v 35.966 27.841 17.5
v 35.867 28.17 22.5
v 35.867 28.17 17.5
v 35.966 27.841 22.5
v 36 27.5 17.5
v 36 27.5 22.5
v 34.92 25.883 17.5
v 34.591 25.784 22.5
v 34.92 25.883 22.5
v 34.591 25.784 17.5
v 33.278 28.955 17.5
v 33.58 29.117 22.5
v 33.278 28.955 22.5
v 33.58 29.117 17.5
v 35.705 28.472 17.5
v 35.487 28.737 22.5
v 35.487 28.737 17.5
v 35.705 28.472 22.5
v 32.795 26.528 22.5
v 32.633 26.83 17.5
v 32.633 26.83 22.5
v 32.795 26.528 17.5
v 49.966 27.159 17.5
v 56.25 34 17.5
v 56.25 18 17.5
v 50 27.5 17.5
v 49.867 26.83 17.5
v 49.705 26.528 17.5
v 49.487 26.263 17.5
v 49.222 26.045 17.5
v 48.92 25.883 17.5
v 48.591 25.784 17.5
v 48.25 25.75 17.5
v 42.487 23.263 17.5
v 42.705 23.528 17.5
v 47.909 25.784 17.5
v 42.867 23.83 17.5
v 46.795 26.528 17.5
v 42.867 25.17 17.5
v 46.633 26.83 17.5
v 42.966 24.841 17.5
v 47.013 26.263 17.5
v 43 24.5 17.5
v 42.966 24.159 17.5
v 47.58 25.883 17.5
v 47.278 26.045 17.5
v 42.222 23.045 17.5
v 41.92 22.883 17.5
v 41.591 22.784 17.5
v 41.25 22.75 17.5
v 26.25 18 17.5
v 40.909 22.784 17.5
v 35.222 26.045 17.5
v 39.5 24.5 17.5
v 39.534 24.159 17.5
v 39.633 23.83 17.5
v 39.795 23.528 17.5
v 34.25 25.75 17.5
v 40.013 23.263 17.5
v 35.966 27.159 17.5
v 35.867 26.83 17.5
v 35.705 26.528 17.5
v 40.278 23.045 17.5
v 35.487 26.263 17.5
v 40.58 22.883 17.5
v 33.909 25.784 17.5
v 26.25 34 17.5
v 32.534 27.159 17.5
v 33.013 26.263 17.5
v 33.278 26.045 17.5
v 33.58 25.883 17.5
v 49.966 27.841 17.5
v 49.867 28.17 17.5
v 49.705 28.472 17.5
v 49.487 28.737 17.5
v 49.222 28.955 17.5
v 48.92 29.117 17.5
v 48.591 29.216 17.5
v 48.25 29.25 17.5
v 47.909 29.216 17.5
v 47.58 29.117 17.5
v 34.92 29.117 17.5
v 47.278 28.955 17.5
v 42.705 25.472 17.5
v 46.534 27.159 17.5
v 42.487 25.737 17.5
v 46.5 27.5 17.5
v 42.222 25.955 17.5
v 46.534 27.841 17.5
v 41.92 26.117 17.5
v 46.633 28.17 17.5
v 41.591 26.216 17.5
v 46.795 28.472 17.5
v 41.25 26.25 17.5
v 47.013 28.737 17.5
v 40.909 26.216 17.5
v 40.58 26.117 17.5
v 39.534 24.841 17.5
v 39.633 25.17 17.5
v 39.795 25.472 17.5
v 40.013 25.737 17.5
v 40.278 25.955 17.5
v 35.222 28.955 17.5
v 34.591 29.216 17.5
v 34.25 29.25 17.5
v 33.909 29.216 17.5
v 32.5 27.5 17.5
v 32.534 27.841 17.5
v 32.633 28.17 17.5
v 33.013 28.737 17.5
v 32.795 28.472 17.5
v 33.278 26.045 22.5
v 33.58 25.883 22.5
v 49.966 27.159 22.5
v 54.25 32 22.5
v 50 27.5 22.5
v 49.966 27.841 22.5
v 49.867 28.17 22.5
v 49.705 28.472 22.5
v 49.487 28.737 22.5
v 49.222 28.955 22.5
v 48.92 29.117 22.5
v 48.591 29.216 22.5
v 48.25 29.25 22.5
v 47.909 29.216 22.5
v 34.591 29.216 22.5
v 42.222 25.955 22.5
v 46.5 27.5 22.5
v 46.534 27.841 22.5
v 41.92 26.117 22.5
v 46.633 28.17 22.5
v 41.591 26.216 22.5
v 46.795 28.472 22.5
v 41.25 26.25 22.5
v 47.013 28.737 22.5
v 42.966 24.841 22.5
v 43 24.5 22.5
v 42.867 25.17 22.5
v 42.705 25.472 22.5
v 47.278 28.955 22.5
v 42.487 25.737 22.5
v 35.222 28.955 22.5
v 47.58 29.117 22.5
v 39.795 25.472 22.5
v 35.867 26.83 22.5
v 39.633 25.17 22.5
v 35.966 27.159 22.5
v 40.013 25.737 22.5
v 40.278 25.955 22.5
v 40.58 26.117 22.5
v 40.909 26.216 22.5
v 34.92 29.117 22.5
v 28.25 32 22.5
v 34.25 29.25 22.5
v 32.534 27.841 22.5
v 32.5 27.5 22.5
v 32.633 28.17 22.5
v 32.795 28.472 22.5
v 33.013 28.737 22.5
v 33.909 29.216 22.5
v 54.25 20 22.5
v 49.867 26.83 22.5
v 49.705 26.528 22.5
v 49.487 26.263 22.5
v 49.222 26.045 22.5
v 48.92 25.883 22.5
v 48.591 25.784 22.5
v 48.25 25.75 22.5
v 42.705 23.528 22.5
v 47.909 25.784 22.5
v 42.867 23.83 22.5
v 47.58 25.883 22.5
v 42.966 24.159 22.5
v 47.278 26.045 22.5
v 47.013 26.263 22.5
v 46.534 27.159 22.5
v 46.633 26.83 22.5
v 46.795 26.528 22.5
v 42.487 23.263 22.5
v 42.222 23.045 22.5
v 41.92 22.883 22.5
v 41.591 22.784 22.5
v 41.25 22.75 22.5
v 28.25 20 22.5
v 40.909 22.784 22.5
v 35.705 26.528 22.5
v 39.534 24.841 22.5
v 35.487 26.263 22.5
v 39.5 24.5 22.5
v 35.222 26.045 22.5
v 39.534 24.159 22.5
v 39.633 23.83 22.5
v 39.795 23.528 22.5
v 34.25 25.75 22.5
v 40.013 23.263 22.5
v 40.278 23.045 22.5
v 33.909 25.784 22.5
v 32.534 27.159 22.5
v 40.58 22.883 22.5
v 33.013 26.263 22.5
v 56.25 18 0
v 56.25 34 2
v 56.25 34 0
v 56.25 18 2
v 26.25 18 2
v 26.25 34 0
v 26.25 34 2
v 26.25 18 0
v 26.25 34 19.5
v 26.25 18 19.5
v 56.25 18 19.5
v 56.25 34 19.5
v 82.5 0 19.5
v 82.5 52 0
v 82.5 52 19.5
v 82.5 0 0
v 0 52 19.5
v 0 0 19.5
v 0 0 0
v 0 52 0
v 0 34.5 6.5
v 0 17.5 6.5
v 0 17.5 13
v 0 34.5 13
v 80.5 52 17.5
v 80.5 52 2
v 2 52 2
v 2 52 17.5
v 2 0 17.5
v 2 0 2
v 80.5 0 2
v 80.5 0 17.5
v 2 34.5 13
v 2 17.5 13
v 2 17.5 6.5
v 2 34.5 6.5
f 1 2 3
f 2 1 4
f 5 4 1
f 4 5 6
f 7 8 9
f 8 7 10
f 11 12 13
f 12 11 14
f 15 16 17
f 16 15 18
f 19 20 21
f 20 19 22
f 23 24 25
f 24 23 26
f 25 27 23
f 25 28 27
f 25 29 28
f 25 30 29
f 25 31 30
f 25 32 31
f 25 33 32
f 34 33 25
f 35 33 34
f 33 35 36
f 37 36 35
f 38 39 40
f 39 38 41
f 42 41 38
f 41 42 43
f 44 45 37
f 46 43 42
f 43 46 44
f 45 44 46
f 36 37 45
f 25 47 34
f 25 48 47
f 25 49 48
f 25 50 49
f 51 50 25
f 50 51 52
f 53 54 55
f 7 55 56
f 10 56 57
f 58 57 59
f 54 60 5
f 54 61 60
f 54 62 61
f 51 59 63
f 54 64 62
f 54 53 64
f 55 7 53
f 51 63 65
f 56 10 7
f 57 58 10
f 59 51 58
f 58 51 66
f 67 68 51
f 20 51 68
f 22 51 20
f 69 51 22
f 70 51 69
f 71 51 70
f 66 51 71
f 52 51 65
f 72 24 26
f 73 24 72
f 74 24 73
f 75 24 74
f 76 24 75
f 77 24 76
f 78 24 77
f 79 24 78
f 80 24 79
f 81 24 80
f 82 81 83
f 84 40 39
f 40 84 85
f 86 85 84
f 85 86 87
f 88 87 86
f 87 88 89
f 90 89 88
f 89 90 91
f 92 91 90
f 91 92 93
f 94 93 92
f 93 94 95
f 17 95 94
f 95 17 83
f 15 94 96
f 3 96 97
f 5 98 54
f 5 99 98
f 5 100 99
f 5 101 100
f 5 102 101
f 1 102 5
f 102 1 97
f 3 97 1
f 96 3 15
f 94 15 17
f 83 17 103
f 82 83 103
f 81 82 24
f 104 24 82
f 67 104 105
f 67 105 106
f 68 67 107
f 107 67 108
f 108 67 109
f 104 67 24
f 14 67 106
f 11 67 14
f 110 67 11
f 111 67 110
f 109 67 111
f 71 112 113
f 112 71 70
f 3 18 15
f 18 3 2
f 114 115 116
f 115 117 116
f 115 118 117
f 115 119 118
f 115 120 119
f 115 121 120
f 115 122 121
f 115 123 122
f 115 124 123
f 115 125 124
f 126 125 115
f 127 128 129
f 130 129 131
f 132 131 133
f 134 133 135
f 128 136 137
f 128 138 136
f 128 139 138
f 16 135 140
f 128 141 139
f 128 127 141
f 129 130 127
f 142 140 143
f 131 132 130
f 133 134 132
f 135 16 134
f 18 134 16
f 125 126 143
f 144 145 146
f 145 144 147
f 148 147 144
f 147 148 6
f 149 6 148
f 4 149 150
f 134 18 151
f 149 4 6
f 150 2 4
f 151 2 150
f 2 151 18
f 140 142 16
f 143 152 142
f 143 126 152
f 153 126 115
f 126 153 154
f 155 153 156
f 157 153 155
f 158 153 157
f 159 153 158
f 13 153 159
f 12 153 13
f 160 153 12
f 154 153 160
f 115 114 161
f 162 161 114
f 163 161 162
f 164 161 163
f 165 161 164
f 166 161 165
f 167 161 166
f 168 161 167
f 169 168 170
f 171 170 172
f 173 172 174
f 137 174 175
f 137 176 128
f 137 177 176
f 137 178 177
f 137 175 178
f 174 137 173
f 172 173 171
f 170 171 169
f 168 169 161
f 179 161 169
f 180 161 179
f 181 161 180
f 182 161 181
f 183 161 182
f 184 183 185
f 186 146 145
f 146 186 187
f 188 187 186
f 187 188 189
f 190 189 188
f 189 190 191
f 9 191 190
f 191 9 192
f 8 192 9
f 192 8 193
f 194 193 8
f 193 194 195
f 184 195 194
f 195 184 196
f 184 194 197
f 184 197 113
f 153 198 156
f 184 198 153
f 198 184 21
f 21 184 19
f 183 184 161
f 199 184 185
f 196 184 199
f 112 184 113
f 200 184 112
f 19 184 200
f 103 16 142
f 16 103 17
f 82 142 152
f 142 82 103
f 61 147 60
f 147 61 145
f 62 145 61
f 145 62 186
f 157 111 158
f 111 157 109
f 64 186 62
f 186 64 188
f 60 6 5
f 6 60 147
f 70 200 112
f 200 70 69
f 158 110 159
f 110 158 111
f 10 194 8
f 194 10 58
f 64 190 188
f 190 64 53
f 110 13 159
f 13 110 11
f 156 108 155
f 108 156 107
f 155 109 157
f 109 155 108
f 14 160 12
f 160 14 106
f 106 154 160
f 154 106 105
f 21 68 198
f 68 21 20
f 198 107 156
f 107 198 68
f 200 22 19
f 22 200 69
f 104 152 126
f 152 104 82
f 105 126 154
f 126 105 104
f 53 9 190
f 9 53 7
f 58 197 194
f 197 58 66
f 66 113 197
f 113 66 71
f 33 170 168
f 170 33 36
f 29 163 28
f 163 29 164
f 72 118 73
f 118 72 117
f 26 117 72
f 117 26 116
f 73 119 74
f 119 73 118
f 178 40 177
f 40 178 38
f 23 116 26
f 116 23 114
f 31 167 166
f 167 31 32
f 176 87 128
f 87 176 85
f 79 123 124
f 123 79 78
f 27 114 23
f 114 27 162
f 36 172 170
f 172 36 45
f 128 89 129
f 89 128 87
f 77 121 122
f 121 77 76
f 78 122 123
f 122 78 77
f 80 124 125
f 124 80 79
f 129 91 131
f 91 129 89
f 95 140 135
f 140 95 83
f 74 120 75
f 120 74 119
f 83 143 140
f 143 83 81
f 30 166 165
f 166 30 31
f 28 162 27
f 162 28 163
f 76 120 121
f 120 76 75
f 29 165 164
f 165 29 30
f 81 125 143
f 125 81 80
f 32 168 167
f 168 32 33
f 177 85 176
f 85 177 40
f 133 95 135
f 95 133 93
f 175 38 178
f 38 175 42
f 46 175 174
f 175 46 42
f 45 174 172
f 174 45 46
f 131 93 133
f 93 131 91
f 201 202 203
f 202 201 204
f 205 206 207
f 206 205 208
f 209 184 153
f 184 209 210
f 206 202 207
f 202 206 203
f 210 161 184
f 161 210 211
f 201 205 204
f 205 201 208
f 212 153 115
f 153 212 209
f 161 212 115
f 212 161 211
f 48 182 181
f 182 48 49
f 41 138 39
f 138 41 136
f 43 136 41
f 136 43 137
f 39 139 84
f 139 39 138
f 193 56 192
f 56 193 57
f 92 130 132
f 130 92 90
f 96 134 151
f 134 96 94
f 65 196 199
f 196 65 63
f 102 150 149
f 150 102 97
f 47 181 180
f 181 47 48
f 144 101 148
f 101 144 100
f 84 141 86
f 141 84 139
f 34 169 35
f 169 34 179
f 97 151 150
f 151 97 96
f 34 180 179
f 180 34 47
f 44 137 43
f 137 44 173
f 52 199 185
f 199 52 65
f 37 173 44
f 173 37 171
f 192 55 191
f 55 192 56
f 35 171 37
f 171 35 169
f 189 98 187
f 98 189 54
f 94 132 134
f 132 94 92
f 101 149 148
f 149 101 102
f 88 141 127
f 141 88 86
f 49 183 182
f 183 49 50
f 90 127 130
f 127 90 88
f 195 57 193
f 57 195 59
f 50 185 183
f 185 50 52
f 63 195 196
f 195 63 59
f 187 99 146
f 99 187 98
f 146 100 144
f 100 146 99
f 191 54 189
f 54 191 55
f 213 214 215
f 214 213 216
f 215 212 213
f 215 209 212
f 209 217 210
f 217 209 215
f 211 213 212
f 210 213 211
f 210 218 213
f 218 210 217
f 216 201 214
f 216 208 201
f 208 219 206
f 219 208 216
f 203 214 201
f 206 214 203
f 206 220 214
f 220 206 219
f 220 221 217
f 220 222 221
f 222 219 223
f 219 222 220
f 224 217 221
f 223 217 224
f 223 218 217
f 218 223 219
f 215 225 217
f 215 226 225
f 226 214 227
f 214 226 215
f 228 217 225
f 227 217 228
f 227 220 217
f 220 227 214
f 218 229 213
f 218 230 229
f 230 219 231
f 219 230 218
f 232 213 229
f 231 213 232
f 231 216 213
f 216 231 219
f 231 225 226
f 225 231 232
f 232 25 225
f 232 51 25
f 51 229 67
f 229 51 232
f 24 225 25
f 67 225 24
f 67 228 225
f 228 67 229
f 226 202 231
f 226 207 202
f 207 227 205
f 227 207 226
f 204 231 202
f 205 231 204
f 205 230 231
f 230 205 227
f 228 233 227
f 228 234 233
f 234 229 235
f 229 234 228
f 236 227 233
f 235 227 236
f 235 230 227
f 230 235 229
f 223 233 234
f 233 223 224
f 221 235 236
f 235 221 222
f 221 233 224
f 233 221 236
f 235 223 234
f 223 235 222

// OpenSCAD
$fn = 32;

hole_r = 1.75;
distance1 = 14;
distance2 = 3;


m_width=30;
m_depth=16;
/* m_height=3; */
m_height=4;
m_base=2;



h_inner_width=78.5;
h_inner_height=15.5;
h_inner_depth=52;
h_thickness=2;


h_outer_width = h_inner_width+(h_thickness*2);
h_outer_height = h_inner_height+(h_thickness*2);
h_outer_depth = h_inner_depth;

render()
main();

module main() {
        translate([(h_outer_width/2)-(m_width/2), (h_outer_depth/2)-(m_depth/2), h_outer_height-h_thickness])
        mount();
        holder();
}

module holder() {

    hdmi_h=6.5;
    hdmi_w=17;

    width = h_inner_width+(h_thickness*2);
    height = h_inner_height+(h_thickness*2);
    depth = h_inner_depth;
    difference() {
        cube([width, depth, height]);
        translate([h_thickness, 0, h_thickness])
        cube([h_inner_width, depth, h_inner_height]);

        translate([0, (depth/2)-(hdmi_w/2), (height/2)-(hdmi_h/2)])
            cube([h_thickness*2, hdmi_w, hdmi_h]);

        translate([(h_outer_width-m_width)/2, (h_outer_depth - m_depth)/2, 0])
            cube([m_width, m_depth, h_outer_height]);
    }
}

module mount() {
    difference() {
        union() {
            hull() {
                cube([m_width, m_depth, m_base]);
                translate([m_height/2, m_height/2, m_height])
                    cube([m_width-m_height, m_depth-m_height, 1]);
            }
        }
        translate([(m_width/2), (m_depth/2)-(distance2/2), 0])
            cylinder(h=m_height+1, r=hole_r);
        translate([(m_width/2)-(distance1/2), (m_depth/2)+(distance2/2), 0]) {
            cylinder(h=m_height+1, r=hole_r);
            translate([distance1, 0, 0])
                cylinder(h=m_height+1, r=hole_r);
        }
    }
}
